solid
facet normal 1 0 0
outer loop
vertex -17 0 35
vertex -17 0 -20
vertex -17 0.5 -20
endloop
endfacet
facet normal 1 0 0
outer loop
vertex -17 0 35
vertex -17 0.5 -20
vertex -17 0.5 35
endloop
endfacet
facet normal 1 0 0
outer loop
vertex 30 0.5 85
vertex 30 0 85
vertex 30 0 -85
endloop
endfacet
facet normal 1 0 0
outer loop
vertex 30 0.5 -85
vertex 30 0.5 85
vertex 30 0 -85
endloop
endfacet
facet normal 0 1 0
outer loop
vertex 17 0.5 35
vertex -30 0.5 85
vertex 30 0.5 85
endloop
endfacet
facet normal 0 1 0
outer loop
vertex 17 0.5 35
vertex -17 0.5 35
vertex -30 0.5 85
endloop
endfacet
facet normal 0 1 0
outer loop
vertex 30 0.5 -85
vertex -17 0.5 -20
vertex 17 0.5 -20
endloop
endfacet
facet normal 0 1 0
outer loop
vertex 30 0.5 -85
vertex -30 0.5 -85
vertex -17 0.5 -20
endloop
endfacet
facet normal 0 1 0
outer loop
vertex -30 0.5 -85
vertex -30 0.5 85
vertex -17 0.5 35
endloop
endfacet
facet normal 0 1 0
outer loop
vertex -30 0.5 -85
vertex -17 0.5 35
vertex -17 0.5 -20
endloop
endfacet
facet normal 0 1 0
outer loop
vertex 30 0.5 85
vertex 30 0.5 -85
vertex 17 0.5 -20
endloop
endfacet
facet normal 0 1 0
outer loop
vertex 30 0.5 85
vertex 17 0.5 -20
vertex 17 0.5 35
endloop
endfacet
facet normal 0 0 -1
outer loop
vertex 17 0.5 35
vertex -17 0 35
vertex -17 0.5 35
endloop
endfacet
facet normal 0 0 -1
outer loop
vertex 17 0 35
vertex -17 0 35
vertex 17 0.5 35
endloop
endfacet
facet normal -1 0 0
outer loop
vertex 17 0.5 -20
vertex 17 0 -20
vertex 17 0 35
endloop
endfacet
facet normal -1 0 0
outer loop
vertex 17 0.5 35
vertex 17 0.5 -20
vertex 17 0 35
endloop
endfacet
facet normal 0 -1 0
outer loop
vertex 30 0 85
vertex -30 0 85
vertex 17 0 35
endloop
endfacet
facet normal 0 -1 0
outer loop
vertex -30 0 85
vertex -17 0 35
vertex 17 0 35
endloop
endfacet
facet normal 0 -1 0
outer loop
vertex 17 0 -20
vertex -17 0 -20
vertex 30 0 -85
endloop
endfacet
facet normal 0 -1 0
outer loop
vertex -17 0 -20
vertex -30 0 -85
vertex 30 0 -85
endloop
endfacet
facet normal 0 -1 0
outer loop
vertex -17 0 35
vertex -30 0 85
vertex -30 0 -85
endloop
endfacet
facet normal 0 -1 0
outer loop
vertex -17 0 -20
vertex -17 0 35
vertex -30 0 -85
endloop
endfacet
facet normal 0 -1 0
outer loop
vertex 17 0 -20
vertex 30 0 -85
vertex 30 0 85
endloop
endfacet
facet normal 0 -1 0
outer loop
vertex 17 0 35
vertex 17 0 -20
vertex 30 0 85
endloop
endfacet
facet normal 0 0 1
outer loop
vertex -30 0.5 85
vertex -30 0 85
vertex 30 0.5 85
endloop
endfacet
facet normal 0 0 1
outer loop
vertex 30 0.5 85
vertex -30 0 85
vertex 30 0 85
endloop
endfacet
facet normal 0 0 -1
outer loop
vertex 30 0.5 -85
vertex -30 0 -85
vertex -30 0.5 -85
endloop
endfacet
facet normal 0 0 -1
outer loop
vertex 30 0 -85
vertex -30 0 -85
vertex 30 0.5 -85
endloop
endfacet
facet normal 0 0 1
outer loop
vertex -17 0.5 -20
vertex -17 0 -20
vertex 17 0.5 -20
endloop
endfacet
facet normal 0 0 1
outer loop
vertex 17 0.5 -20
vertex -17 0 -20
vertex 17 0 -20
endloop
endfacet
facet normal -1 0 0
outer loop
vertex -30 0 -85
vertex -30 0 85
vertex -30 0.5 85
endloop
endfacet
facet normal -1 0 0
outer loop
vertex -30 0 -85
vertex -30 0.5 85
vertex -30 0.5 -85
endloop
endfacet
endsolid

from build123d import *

# Parameters (mm, degrees)
SKETCH1_W           = 60
SKETCH1_H           = 170
BOSS_EXTRUDE1_DEPTH = 0.5
SKETCH2_W           = 34
SKETCH2_H           = 55
CUT_EXTRUDE1_DEPTH  = 10


with BuildPart() as part:
    # Sketch1 → Boss-Extrude1 (new body)
    with BuildSketch(Plane(origin=(0, 0, 0), x_dir=(1, 0, 0), z_dir=(0, 1, 0))):
        Rectangle(SKETCH1_W, SKETCH1_H)
    extrude(amount=BOSS_EXTRUDE1_DEPTH)

    # Sketch2 → Cut-Extrude1 (cut)
    with BuildSketch(Plane.XZ):
        with Locations((0, 7.5)):
            Rectangle(SKETCH2_W, SKETCH2_H)
    extrude(amount=-CUT_EXTRUDE1_DEPTH, mode=Mode.SUBTRACT)


solid = part.part
